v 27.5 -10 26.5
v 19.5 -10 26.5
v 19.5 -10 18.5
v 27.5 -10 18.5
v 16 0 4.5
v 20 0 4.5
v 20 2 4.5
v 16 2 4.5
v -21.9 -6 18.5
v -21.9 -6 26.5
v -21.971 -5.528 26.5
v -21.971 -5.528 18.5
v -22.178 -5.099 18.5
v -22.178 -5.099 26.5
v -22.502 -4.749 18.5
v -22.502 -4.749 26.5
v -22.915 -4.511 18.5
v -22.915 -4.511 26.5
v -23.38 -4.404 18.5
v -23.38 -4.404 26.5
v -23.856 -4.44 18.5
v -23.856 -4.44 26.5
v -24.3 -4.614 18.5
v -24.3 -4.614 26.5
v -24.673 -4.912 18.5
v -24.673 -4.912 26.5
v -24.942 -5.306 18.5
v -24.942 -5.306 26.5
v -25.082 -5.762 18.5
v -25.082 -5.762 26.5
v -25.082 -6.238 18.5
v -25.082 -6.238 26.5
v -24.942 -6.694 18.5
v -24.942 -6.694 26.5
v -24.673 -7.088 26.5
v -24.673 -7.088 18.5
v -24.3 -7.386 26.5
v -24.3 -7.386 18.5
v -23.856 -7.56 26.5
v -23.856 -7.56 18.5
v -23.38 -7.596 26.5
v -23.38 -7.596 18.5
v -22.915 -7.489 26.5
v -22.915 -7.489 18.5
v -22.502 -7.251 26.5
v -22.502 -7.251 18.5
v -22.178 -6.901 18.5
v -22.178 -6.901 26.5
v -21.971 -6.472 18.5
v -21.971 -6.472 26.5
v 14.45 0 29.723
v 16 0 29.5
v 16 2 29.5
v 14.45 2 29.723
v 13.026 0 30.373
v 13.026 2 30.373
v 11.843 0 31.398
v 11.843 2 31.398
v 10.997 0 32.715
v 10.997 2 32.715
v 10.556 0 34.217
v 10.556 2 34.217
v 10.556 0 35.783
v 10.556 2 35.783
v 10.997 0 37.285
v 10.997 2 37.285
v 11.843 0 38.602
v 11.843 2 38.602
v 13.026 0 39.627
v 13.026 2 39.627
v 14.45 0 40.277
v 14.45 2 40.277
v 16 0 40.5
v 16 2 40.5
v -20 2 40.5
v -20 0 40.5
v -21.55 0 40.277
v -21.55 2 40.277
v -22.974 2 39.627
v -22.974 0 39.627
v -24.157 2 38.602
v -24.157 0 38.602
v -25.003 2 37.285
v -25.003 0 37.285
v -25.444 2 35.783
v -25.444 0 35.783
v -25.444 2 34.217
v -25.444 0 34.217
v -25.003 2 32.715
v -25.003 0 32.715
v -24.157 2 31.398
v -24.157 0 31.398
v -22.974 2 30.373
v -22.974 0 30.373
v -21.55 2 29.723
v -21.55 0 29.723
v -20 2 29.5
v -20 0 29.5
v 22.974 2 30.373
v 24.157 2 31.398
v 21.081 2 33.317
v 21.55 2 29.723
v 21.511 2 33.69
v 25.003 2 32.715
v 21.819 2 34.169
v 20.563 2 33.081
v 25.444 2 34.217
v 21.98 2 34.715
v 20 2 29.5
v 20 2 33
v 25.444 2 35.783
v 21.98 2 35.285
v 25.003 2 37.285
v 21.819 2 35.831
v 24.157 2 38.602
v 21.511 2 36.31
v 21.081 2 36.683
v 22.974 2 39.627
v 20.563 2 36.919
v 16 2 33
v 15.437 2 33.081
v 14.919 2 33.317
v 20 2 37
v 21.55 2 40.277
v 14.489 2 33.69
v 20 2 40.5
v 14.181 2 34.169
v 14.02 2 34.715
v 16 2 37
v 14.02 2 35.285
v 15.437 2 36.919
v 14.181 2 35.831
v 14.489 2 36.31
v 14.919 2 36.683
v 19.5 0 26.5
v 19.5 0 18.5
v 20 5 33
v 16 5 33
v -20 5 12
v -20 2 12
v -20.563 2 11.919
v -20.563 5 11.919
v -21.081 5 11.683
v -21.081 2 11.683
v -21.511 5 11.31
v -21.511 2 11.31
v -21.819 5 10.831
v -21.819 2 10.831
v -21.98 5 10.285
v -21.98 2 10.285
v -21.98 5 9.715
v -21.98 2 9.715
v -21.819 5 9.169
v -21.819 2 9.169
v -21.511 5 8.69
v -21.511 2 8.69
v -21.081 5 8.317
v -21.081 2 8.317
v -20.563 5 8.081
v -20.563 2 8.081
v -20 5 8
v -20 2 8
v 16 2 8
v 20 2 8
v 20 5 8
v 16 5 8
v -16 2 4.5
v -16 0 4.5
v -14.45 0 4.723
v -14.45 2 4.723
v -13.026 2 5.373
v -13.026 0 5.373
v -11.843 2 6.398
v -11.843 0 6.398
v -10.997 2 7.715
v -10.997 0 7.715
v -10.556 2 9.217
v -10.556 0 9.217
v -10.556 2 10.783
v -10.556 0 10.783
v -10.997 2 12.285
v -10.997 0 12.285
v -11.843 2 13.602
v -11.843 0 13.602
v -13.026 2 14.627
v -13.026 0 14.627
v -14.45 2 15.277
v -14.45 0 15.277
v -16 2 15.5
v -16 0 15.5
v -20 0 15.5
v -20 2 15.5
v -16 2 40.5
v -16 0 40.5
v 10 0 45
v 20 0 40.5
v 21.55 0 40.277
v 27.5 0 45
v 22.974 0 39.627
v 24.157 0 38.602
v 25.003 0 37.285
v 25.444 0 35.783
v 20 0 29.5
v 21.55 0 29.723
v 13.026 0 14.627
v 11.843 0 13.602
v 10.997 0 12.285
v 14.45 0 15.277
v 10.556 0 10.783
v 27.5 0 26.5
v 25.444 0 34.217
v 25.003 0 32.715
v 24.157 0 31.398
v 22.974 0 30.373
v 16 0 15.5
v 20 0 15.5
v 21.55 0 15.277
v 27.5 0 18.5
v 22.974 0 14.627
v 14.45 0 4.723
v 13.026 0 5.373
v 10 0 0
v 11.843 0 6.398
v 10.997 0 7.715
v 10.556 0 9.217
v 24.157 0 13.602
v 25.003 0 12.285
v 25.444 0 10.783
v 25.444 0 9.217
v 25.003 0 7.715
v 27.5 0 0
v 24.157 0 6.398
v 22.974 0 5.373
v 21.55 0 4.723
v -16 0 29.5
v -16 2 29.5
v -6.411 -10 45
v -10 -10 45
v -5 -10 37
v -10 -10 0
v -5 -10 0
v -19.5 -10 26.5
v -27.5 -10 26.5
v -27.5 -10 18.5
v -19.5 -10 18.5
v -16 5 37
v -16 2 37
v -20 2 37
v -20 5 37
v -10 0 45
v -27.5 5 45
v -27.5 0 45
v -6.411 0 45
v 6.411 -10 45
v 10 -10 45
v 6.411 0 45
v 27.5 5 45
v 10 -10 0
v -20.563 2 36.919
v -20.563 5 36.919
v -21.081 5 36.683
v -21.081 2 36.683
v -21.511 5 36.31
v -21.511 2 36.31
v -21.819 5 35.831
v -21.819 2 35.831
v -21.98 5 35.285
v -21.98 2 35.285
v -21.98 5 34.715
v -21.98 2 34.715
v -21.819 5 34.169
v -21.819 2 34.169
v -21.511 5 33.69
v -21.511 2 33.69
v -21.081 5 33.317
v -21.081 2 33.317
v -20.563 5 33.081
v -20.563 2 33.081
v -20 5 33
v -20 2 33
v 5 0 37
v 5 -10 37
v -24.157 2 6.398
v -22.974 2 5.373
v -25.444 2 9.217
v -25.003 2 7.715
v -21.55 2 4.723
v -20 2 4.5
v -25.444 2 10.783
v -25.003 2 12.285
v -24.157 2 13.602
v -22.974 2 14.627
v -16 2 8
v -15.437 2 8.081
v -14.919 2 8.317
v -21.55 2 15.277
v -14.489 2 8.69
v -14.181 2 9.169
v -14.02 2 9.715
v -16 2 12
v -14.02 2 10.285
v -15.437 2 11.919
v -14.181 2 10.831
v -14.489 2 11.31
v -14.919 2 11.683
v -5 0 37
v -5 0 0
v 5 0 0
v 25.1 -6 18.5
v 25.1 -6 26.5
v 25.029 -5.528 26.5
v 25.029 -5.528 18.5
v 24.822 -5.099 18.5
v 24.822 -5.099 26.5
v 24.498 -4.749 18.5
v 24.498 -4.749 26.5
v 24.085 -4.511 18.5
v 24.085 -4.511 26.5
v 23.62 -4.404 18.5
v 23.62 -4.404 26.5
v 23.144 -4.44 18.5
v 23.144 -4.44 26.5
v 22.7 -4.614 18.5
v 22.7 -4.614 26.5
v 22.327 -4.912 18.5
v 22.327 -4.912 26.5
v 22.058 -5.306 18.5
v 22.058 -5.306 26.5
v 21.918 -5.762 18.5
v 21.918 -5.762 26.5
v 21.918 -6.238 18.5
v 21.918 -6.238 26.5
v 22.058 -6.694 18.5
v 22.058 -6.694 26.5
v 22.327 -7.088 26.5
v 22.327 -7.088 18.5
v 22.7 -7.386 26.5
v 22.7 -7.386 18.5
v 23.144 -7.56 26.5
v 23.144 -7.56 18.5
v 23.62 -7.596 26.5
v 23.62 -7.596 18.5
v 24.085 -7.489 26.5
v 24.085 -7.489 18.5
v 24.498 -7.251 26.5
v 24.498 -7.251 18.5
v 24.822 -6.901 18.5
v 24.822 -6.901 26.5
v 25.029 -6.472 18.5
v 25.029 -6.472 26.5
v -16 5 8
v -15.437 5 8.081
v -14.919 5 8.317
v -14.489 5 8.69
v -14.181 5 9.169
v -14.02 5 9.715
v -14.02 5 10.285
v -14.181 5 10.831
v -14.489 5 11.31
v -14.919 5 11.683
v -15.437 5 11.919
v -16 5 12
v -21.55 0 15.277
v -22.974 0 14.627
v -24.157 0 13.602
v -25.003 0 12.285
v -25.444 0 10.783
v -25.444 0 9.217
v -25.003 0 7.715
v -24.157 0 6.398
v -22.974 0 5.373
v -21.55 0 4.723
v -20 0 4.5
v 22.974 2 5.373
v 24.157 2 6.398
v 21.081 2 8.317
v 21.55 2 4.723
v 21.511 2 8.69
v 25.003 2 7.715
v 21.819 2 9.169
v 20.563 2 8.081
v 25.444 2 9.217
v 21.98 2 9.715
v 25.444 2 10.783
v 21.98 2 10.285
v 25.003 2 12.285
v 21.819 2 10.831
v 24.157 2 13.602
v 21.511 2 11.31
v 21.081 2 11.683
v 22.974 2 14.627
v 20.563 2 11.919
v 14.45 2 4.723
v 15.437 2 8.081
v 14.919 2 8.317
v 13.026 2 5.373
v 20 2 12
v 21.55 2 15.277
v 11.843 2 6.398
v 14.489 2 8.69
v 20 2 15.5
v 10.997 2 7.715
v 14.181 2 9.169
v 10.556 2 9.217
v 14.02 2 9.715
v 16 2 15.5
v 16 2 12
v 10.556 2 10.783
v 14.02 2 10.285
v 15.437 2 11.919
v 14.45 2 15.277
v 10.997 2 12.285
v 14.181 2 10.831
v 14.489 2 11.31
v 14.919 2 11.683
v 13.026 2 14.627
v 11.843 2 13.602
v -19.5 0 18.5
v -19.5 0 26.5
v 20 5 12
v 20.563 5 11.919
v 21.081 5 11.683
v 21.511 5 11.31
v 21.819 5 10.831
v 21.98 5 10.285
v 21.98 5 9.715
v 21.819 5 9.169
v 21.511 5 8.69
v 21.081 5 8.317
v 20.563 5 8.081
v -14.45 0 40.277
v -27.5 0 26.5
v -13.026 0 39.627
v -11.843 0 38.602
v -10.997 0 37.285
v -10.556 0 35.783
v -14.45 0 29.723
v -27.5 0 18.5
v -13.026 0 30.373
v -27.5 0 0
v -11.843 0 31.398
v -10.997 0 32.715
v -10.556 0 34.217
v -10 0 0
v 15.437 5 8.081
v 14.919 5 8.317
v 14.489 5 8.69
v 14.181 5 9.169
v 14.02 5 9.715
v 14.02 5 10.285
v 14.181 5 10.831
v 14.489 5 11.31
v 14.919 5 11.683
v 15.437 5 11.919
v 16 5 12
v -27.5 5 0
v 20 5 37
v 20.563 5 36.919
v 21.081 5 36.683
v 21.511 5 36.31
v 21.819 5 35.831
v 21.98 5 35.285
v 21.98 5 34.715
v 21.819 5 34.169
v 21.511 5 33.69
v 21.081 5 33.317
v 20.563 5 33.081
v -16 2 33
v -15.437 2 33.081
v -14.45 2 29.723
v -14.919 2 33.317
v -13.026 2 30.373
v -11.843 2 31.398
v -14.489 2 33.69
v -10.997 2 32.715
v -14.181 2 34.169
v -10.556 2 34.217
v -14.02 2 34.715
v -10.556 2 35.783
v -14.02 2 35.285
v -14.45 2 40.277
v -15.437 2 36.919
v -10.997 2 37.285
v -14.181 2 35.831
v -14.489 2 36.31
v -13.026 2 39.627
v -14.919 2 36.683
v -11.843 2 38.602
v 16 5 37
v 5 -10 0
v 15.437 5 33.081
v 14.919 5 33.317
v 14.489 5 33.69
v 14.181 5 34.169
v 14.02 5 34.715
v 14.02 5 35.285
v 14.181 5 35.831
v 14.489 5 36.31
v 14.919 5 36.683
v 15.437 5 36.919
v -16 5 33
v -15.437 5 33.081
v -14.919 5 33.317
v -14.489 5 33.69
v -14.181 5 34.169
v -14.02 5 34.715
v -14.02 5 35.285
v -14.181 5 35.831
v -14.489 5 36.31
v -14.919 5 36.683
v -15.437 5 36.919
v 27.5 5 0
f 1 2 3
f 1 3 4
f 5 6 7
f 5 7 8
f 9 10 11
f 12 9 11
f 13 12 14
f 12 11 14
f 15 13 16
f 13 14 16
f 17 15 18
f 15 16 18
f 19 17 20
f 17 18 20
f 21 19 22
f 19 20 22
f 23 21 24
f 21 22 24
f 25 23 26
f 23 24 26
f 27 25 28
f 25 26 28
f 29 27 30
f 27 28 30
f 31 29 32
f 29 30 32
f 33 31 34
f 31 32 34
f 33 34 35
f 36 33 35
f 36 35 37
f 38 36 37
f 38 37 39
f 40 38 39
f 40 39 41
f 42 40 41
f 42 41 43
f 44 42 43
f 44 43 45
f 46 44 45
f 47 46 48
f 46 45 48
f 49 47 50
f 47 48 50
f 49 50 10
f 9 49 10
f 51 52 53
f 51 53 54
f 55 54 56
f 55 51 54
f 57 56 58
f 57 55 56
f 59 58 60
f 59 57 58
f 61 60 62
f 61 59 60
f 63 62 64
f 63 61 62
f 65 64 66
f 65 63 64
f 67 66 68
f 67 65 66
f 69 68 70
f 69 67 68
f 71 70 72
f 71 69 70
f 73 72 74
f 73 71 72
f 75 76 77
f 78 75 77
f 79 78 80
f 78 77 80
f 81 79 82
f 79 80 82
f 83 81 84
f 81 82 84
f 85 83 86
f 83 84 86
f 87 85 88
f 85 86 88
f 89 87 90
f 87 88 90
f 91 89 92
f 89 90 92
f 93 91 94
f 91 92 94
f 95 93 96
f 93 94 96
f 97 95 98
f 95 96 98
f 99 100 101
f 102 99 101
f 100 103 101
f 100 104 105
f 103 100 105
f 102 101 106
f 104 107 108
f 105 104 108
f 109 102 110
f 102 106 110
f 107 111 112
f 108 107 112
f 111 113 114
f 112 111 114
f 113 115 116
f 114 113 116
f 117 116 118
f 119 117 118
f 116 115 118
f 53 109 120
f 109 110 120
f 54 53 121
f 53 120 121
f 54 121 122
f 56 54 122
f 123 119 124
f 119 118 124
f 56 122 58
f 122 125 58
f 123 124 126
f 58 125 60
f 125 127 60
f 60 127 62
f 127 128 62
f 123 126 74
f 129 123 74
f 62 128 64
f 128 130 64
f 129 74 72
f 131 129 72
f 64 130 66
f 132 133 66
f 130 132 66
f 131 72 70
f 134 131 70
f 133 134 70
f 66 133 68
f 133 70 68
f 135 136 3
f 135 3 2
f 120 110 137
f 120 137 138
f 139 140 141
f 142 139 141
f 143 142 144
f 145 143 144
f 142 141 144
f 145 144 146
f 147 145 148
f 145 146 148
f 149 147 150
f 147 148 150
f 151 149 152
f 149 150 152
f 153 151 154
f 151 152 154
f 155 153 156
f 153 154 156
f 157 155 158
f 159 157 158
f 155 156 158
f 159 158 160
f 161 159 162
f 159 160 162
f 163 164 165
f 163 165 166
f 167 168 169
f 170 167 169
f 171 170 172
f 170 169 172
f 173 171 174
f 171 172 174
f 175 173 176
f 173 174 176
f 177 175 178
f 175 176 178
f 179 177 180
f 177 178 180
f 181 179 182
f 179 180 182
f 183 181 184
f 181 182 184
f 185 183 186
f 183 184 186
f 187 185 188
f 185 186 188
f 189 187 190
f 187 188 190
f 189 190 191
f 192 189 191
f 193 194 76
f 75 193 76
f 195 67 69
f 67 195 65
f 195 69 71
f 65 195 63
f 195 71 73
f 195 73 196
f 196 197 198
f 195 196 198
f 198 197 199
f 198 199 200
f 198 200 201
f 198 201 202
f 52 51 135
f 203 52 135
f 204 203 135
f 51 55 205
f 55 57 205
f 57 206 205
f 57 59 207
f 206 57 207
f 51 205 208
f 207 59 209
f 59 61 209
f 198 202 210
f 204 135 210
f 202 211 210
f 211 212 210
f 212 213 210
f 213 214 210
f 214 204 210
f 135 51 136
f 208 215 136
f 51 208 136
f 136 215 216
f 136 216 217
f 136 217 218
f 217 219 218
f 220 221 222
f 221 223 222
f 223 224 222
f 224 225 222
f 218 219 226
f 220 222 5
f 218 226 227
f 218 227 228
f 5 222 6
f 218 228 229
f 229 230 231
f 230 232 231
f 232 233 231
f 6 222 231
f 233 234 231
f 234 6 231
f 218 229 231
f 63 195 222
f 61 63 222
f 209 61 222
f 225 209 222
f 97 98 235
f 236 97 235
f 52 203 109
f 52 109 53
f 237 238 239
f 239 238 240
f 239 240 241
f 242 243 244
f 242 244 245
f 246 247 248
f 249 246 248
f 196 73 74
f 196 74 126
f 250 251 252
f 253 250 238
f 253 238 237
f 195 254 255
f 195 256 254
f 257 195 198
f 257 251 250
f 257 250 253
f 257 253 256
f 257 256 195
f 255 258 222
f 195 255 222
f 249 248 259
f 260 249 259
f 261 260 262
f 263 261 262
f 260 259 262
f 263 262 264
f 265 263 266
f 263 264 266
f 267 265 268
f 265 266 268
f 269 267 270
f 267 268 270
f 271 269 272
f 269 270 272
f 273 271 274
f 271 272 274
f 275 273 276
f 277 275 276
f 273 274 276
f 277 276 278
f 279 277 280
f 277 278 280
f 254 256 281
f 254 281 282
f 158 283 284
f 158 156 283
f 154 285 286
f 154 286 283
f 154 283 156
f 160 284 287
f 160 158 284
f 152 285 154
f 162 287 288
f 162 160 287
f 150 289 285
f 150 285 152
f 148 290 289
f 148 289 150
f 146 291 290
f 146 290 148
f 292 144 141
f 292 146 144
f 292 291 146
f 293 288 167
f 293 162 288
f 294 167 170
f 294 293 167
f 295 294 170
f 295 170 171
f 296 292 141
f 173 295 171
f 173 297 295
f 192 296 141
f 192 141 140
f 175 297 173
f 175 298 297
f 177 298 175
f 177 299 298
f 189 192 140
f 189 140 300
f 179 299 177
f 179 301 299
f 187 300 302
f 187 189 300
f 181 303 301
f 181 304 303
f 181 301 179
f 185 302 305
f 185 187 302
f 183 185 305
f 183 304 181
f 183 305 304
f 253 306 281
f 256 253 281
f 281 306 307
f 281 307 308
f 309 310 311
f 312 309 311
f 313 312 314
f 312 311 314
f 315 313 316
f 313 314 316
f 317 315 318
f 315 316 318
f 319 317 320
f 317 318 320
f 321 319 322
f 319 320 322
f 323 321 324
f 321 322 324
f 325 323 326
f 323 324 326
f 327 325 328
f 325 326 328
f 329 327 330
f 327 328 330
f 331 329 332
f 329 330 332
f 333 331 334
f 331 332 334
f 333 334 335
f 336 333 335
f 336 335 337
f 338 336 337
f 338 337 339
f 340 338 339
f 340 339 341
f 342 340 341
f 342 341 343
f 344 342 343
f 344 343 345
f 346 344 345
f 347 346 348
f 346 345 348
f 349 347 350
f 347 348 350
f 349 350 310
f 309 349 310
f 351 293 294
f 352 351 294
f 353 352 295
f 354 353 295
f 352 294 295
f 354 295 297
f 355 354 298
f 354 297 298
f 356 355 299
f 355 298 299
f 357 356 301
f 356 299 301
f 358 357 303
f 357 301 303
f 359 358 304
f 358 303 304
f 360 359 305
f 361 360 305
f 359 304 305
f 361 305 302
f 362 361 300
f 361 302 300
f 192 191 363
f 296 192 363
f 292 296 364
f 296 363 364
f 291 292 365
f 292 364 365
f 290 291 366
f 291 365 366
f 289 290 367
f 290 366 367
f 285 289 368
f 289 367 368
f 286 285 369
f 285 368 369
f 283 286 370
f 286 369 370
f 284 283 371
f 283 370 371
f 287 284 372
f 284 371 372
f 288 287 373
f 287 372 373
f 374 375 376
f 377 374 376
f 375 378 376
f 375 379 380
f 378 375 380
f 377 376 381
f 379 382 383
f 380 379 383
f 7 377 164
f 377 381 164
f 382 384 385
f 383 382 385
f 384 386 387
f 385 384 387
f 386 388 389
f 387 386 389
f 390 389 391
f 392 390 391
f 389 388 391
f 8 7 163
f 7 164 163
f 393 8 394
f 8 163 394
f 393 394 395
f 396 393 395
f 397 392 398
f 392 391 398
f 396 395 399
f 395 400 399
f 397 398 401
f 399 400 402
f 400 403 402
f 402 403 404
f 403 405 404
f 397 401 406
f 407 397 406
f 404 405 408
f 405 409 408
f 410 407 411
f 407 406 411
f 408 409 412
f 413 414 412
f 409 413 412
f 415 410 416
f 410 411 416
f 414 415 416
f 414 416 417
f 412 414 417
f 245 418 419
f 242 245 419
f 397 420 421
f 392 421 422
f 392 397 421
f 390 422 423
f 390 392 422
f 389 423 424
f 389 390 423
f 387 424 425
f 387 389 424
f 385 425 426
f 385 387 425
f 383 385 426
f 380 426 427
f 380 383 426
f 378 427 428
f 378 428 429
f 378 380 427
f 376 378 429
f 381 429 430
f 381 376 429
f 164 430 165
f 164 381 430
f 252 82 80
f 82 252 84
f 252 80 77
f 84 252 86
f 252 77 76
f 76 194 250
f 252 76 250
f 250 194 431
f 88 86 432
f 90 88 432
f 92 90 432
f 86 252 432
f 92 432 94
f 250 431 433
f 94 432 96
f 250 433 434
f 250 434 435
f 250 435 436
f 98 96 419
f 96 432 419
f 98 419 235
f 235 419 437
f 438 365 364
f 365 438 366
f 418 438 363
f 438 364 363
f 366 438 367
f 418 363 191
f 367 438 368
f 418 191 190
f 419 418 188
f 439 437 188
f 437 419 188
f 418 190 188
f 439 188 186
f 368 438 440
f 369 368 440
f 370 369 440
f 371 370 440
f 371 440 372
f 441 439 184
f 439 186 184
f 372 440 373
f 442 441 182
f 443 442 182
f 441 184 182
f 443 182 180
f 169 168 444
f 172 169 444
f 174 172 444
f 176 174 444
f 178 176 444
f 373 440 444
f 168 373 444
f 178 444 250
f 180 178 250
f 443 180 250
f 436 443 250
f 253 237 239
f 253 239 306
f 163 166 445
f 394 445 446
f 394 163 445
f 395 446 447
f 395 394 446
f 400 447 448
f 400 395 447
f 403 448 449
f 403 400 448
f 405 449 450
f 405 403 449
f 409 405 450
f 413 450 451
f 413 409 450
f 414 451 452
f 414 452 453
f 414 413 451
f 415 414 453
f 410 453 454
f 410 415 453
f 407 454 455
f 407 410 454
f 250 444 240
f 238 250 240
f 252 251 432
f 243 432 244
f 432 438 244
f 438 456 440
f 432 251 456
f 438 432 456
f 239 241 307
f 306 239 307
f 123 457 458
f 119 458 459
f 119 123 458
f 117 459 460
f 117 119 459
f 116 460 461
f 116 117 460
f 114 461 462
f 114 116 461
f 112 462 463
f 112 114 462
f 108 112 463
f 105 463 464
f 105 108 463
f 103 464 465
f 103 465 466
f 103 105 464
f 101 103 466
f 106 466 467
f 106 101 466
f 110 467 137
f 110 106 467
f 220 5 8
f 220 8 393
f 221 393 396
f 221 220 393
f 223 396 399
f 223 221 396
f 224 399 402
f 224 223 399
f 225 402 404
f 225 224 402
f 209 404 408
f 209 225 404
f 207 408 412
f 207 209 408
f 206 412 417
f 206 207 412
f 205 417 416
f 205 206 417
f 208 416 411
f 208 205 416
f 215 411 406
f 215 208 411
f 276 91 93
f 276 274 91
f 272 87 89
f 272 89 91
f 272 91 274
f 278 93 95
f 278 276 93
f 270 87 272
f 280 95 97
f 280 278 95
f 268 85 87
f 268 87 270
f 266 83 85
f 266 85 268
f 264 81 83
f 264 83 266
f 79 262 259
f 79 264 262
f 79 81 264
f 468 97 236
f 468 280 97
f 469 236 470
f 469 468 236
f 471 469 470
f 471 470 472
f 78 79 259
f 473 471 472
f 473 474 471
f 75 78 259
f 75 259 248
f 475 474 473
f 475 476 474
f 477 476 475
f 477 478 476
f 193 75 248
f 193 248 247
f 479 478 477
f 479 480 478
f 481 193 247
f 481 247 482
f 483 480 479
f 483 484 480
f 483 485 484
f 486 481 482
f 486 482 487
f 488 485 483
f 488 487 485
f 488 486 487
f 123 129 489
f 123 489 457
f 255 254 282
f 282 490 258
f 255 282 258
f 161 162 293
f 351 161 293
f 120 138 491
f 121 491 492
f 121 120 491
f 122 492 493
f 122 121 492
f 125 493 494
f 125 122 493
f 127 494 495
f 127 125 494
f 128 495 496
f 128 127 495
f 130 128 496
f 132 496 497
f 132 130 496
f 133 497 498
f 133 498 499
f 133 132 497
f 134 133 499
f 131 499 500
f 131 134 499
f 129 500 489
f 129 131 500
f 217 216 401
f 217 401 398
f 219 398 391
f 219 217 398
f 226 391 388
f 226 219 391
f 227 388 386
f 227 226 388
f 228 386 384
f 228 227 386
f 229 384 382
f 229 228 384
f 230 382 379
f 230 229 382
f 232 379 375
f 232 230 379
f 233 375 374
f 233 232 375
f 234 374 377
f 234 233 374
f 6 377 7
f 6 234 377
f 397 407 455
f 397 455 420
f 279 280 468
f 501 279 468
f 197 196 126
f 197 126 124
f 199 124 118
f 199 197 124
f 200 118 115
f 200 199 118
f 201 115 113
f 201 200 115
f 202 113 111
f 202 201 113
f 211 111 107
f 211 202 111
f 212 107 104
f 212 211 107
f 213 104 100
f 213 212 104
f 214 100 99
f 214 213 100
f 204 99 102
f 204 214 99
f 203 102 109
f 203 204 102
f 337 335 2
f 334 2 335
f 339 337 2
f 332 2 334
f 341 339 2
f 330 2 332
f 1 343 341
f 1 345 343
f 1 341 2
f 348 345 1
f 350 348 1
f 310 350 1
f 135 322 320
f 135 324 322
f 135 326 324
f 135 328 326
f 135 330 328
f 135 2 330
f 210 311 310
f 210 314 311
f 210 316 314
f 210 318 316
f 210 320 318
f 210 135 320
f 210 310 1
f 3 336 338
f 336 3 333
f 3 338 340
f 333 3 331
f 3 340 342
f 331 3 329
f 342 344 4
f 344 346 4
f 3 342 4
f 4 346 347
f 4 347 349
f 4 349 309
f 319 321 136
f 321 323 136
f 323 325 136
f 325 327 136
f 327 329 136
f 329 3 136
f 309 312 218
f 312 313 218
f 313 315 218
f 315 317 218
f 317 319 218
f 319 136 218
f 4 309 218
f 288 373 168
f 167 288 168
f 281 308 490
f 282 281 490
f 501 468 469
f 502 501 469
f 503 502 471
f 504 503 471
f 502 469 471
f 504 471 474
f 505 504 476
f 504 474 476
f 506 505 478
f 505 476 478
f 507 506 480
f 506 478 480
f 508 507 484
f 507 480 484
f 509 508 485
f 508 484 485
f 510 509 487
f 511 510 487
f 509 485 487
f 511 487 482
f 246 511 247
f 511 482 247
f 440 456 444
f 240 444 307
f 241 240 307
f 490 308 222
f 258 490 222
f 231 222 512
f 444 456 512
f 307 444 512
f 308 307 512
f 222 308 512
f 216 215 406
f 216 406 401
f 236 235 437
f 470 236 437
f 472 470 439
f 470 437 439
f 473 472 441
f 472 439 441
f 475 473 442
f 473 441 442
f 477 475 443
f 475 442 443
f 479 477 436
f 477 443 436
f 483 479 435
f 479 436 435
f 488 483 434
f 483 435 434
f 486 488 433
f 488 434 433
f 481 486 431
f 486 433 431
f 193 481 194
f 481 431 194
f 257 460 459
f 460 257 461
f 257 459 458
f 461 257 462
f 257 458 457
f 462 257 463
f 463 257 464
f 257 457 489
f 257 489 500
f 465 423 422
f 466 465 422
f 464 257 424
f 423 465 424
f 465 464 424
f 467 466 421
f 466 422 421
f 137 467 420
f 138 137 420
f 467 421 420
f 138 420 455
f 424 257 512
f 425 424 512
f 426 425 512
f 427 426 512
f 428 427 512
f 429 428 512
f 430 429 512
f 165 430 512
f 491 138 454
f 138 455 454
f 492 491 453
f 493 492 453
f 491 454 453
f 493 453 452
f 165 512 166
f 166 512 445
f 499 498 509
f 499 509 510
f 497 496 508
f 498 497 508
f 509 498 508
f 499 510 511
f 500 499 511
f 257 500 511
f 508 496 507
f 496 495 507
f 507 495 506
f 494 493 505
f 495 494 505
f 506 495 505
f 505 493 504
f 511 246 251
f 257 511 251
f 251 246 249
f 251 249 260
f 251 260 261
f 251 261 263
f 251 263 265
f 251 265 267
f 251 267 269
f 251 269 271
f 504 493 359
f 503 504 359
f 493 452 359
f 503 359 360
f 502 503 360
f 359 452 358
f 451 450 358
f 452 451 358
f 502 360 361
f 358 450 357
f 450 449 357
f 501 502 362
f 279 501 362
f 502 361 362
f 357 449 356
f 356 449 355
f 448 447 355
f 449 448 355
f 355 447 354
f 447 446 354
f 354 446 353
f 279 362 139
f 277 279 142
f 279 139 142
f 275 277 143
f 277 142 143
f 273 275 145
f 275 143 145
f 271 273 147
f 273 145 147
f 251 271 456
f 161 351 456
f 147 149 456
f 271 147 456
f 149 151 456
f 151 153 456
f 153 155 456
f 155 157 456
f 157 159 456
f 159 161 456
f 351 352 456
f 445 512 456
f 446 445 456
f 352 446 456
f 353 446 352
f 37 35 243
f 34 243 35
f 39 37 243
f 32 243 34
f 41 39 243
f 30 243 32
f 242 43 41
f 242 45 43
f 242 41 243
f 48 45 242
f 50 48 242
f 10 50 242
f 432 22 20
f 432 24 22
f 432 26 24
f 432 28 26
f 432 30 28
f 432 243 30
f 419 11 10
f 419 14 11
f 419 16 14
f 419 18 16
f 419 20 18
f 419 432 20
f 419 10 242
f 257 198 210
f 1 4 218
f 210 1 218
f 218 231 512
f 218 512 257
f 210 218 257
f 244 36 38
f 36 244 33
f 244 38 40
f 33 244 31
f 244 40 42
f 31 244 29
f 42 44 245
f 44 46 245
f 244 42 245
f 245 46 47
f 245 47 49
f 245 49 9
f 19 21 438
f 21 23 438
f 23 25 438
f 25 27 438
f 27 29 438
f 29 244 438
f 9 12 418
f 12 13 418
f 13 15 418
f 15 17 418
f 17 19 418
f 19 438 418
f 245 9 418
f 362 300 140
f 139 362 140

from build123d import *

# Parameters (mm, degrees)
F1_DEPTH   = 45
F3_DEPTH   = 5
F5_DEPTH   = 2
F6_SIZE2   = 1.4106158457
F6_SIZE    = 8
F6_2_SIZE2 = 1.4106158457
F6_2_SIZE  = 8
F7_W       = 8
F7_H       = 8
F8_DEPTH   = 10
F9_R       = 1.6
F10_DEPTH  = 8


# Not quite as in the source:
# - a pattern or mirror of a feature is missing from the dataset's text; its kind, count and spacing are read off the source's solid


with BuildPart() as f1:
    # F0 (on Top) → F1 (new body)
    with BuildSketch(Plane.XY):
        Polygon((-5, -10), (-5, 0), (5, 0), (5, -10), (10, -10), (10, 0), (27.5, 0), (27.5, 5), (-27.5, 5), (-27.5, 0), (-10, 0), (-10, -10), align=None)
    extrude(amount=F1_DEPTH)

    # F2 (on face) → F3 (cut, through all)
    with BuildSketch(Plane.XZ):
        with BuildLine():
            Line((-16, 37), (-20, 37))
            ThreePointArc((-20, 37), (-22, 35), (-20, 33))
            Line((-20, 33), (-16, 33))
            ThreePointArc((-16, 33), (-14, 35), (-16, 37))
        make_face()
        with BuildLine():
            Line((-20, 8), (-16, 8))
            ThreePointArc((-16, 8), (-14, 10), (-16, 12))
            Line((-16, 12), (-20, 12))
            ThreePointArc((-20, 12), (-22, 10), (-20, 8))
        make_face()
    f3 = extrude(amount=-F3_DEPTH, mode=Mode.SUBTRACT)

    # F3_copies: F3 across plane
    add(f3.mirror(Plane(origin=(0, 0, 0), x_dir=(0, 0, 1), z_dir=(1, 0, 0))), mode=Mode.SUBTRACT)

    # F4 (on face) → F5 (cut)
    with BuildSketch(Plane.XZ):
        with BuildLine():
            Line((-16, 40.5), (-20, 40.5))
            ThreePointArc((-20, 40.5), (-25.5, 35), (-20, 29.5))
            Line((-20, 29.5), (-16, 29.5))
            ThreePointArc((-16, 29.5), (-10.5, 35), (-16, 40.5))
        make_face()
        with BuildLine():
            Line((-16, 15.5), (-20, 15.5))
            ThreePointArc((-20, 15.5), (-25.5, 10), (-20, 4.5))
            Line((-20, 4.5), (-16, 4.5))
            ThreePointArc((-16, 4.5), (-10.5, 10), (-16, 15.5))
        make_face()
    f5 = extrude(amount=-F5_DEPTH, mode=Mode.SUBTRACT)

    # F5_copies: F5 across plane
    add(f5.mirror(Plane(origin=(0, 0, 0), x_dir=(0, 0, 1), z_dir=(1, 0, 0))), mode=Mode.SUBTRACT)

    # F6
    f6_edges = [f1.edges().sort_by_distance(p)[0] for p in [
        (-5, -5, 45),
    ]]
    f6_side = f1.faces().sort_by_distance((-5, -5, 22.5))[0]
    chamfer(f6_edges, length=F6_SIZE, length2=F6_SIZE2, reference=f6_side)

    # F6#2
    f6_2_edges = [f1.edges().sort_by_distance(p)[0] for p in [
        (5, -5, 45),
    ]]
    f6_2_side = f1.faces().sort_by_distance((5, -5, 22.5))[0]
    chamfer(f6_2_edges, length=F6_2_SIZE, length2=F6_2_SIZE2, reference=f6_2_side)

    # F7 (on face) → F8 (join)
    with BuildSketch(Plane.XZ):
        with Locations((-23.5, 22.5)):
            Rectangle(F7_W, F7_H)
        with Locations((23.5, 22.5)):
            Rectangle(F7_W, F7_H)
    extrude(amount=F8_DEPTH)

    # F9 (on face) → F10 (cut, through all)
    with BuildSketch(Plane.XY.offset(26.5)):
        with Locations((-23.5, -6)):
            Circle(F9_R)
        with Locations((23.5, -6)):
            Circle(F9_R)
    extrude(amount=-F10_DEPTH, mode=Mode.SUBTRACT)


solid = f1.part
